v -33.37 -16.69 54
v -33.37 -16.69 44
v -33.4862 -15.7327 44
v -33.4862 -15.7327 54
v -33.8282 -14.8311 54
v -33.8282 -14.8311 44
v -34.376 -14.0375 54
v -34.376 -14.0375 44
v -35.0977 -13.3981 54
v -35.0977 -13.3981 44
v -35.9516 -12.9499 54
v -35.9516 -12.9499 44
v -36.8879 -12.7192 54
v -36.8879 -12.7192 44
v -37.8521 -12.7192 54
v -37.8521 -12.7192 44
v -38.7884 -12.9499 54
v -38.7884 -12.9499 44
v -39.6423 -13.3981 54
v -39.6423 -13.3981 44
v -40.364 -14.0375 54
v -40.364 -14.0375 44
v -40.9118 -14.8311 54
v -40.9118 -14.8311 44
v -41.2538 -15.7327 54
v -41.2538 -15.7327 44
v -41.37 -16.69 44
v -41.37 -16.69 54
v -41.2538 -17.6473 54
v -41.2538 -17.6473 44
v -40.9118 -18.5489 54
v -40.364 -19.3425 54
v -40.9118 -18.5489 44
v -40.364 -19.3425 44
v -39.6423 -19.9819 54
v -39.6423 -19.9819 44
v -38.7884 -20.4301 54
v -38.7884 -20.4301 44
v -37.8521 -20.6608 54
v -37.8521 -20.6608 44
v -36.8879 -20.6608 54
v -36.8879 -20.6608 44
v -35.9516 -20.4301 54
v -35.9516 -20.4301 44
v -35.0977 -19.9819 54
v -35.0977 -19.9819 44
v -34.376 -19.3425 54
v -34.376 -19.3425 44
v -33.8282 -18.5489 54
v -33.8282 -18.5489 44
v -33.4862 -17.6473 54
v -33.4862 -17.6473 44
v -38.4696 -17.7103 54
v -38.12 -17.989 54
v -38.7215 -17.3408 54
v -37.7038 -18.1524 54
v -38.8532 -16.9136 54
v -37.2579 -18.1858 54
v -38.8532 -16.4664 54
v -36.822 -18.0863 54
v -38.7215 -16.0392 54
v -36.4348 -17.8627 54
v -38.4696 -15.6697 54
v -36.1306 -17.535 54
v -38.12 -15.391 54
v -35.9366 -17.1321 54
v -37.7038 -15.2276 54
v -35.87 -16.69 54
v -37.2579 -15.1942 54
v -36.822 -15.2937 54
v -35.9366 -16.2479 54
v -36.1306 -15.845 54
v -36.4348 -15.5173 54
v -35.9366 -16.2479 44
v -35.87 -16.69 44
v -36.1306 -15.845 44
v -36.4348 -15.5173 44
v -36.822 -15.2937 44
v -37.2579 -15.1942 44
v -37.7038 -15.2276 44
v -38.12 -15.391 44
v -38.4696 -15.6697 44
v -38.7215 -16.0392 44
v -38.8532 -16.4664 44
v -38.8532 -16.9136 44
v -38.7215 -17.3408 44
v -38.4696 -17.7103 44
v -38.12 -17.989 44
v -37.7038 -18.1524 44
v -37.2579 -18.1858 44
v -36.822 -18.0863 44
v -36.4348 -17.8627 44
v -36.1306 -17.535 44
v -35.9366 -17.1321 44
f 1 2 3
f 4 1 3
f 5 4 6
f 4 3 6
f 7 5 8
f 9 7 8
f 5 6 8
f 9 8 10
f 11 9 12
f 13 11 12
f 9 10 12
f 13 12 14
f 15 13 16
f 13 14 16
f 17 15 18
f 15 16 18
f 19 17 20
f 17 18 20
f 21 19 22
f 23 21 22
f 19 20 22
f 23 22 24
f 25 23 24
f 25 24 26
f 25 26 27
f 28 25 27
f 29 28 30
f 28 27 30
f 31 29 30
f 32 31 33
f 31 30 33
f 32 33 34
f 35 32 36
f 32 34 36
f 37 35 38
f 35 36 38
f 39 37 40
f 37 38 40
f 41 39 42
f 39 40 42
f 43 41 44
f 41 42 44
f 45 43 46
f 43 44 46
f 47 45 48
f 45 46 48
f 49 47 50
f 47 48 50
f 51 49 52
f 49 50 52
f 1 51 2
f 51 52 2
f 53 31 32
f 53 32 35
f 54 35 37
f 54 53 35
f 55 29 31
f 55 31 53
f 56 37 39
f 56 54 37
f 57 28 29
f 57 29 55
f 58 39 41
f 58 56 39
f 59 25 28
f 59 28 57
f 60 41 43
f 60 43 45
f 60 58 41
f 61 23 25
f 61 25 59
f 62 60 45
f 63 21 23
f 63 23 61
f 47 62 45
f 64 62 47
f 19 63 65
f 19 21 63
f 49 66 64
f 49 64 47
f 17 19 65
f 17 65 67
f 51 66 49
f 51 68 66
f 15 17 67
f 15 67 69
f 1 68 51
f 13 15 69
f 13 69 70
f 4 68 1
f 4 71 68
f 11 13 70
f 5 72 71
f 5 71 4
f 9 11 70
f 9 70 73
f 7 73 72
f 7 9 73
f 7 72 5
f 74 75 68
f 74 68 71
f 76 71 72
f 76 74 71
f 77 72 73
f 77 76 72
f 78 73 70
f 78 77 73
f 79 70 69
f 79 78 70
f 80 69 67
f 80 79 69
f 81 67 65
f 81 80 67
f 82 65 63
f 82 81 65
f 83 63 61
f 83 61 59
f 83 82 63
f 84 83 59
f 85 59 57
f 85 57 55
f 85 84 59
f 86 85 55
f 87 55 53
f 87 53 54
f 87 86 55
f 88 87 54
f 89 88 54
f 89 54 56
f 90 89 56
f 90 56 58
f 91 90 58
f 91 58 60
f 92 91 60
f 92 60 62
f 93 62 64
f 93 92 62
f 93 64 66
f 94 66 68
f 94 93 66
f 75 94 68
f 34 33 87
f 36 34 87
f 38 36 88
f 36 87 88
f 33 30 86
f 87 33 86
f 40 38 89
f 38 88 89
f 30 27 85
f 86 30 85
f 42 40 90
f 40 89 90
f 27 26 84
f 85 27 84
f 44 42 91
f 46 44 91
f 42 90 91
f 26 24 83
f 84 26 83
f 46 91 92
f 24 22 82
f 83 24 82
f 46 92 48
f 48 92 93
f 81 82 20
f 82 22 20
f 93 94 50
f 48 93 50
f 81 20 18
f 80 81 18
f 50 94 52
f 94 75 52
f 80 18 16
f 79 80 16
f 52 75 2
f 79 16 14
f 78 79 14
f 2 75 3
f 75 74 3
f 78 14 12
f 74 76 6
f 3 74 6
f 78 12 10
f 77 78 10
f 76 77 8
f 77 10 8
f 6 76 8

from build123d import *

# Parameters (mm, degrees)
CYLINDER006_R     = 1.5
CYLINDER006_DEPTH = 10
CYLINDER007_R     = 4
CYLINDER007_DEPTH = 10


with BuildPart() as cylinder006:
    # Cylinder006 → Cylinder006 (new body)
    with BuildSketch(Plane(origin=(-37.37, -16.69, 44), x_dir=(1, 0, 0), z_dir=(0, 0, 1))):
        Circle(CYLINDER006_R)
    extrude(amount=CYLINDER006_DEPTH)


with BuildPart() as cut013014002:
    # Cylinder007 → Cylinder007 (new body)
    with BuildSketch(Plane(origin=(-37.37, -16.69, 44), x_dir=(1, 0, 0), z_dir=(0, 0, 1))):
        Circle(CYLINDER007_R)
    extrude(amount=CYLINDER007_DEPTH)

    # Cut013014002: cut Cylinder006
    add(cylinder006.part, mode=Mode.SUBTRACT)


solid = cut013014002.part
